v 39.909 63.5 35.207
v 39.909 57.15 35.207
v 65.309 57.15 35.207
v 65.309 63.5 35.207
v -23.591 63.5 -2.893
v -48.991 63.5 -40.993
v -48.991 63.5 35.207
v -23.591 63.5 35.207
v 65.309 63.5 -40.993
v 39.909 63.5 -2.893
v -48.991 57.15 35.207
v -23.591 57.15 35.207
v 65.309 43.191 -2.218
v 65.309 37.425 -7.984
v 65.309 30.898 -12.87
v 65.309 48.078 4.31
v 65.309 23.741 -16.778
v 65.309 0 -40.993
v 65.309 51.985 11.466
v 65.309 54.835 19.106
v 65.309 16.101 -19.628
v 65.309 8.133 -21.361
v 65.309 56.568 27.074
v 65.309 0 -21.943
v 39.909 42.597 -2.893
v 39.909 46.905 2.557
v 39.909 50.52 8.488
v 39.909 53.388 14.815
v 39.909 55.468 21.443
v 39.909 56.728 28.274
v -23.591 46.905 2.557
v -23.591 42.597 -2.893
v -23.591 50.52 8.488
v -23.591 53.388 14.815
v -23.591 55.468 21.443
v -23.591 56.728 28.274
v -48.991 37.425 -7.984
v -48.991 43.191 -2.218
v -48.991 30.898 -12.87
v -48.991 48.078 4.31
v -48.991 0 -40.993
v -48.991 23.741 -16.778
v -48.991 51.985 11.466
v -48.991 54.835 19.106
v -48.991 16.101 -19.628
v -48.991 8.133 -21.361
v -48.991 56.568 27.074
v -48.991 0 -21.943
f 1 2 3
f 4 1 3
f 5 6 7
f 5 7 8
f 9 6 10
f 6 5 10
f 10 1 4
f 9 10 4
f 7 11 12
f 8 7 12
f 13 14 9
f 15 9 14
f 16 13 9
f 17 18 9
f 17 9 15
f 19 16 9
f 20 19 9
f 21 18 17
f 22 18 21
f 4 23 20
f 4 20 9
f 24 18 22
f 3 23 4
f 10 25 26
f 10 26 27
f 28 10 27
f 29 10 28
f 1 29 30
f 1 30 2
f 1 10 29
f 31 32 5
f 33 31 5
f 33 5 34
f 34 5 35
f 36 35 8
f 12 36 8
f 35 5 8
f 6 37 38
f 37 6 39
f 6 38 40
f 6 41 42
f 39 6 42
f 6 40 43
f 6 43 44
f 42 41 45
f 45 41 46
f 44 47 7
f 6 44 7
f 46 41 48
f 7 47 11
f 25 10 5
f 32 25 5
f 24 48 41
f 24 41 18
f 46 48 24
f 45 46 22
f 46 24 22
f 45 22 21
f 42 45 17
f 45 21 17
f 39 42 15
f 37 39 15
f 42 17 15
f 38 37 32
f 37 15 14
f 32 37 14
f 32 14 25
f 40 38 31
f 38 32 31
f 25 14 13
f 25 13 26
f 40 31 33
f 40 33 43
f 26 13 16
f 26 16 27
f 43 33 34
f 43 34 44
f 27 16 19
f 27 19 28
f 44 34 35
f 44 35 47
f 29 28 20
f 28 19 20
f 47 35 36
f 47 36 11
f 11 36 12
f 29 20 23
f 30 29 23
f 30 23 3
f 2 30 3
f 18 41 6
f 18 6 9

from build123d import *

# Parameters (mm, degrees)
F0_W     = 114.3
F0_H     = 76.2
F1_DEPTH = 63.5
F3_DEPTH = 114.301
F4_W     = 63.5
F4_H     = 38.1
F5_DEPTH = 63.501


with BuildPart() as f1:
    # F0 (on Front) → F1 (new body)
    with BuildSketch(Plane.XZ):
        with Locations((8.159315, -2.892731)):
            Rectangle(F0_W, F0_H)
    extrude(amount=-F1_DEPTH)

    # F2 (on face) → F3 (cut, through all)
    with BuildSketch(Plane.YZ.offset(65.309315)):
        with BuildLine():
            Line((0, 35.207269), (0, -21.942731))
            ThreePointArc((0, -21.942731), (40.411153, -5.203884), (57.15, 35.207269))
            Line((57.15, 35.207269), (0, 35.207269))
        make_face()
    extrude(amount=-F3_DEPTH, mode=Mode.SUBTRACT)

    # F4 (on face) → F5 (cut, through all)
    with BuildSketch(Plane(origin=(0, 63.5, 0), x_dir=(-1, 0, 0), z_dir=(0, 1, 0))):
        with Locations((-8.159315, 16.157269)):
            Rectangle(F4_W, F4_H)
    extrude(amount=-F5_DEPTH, mode=Mode.SUBTRACT)


solid = f1.part
